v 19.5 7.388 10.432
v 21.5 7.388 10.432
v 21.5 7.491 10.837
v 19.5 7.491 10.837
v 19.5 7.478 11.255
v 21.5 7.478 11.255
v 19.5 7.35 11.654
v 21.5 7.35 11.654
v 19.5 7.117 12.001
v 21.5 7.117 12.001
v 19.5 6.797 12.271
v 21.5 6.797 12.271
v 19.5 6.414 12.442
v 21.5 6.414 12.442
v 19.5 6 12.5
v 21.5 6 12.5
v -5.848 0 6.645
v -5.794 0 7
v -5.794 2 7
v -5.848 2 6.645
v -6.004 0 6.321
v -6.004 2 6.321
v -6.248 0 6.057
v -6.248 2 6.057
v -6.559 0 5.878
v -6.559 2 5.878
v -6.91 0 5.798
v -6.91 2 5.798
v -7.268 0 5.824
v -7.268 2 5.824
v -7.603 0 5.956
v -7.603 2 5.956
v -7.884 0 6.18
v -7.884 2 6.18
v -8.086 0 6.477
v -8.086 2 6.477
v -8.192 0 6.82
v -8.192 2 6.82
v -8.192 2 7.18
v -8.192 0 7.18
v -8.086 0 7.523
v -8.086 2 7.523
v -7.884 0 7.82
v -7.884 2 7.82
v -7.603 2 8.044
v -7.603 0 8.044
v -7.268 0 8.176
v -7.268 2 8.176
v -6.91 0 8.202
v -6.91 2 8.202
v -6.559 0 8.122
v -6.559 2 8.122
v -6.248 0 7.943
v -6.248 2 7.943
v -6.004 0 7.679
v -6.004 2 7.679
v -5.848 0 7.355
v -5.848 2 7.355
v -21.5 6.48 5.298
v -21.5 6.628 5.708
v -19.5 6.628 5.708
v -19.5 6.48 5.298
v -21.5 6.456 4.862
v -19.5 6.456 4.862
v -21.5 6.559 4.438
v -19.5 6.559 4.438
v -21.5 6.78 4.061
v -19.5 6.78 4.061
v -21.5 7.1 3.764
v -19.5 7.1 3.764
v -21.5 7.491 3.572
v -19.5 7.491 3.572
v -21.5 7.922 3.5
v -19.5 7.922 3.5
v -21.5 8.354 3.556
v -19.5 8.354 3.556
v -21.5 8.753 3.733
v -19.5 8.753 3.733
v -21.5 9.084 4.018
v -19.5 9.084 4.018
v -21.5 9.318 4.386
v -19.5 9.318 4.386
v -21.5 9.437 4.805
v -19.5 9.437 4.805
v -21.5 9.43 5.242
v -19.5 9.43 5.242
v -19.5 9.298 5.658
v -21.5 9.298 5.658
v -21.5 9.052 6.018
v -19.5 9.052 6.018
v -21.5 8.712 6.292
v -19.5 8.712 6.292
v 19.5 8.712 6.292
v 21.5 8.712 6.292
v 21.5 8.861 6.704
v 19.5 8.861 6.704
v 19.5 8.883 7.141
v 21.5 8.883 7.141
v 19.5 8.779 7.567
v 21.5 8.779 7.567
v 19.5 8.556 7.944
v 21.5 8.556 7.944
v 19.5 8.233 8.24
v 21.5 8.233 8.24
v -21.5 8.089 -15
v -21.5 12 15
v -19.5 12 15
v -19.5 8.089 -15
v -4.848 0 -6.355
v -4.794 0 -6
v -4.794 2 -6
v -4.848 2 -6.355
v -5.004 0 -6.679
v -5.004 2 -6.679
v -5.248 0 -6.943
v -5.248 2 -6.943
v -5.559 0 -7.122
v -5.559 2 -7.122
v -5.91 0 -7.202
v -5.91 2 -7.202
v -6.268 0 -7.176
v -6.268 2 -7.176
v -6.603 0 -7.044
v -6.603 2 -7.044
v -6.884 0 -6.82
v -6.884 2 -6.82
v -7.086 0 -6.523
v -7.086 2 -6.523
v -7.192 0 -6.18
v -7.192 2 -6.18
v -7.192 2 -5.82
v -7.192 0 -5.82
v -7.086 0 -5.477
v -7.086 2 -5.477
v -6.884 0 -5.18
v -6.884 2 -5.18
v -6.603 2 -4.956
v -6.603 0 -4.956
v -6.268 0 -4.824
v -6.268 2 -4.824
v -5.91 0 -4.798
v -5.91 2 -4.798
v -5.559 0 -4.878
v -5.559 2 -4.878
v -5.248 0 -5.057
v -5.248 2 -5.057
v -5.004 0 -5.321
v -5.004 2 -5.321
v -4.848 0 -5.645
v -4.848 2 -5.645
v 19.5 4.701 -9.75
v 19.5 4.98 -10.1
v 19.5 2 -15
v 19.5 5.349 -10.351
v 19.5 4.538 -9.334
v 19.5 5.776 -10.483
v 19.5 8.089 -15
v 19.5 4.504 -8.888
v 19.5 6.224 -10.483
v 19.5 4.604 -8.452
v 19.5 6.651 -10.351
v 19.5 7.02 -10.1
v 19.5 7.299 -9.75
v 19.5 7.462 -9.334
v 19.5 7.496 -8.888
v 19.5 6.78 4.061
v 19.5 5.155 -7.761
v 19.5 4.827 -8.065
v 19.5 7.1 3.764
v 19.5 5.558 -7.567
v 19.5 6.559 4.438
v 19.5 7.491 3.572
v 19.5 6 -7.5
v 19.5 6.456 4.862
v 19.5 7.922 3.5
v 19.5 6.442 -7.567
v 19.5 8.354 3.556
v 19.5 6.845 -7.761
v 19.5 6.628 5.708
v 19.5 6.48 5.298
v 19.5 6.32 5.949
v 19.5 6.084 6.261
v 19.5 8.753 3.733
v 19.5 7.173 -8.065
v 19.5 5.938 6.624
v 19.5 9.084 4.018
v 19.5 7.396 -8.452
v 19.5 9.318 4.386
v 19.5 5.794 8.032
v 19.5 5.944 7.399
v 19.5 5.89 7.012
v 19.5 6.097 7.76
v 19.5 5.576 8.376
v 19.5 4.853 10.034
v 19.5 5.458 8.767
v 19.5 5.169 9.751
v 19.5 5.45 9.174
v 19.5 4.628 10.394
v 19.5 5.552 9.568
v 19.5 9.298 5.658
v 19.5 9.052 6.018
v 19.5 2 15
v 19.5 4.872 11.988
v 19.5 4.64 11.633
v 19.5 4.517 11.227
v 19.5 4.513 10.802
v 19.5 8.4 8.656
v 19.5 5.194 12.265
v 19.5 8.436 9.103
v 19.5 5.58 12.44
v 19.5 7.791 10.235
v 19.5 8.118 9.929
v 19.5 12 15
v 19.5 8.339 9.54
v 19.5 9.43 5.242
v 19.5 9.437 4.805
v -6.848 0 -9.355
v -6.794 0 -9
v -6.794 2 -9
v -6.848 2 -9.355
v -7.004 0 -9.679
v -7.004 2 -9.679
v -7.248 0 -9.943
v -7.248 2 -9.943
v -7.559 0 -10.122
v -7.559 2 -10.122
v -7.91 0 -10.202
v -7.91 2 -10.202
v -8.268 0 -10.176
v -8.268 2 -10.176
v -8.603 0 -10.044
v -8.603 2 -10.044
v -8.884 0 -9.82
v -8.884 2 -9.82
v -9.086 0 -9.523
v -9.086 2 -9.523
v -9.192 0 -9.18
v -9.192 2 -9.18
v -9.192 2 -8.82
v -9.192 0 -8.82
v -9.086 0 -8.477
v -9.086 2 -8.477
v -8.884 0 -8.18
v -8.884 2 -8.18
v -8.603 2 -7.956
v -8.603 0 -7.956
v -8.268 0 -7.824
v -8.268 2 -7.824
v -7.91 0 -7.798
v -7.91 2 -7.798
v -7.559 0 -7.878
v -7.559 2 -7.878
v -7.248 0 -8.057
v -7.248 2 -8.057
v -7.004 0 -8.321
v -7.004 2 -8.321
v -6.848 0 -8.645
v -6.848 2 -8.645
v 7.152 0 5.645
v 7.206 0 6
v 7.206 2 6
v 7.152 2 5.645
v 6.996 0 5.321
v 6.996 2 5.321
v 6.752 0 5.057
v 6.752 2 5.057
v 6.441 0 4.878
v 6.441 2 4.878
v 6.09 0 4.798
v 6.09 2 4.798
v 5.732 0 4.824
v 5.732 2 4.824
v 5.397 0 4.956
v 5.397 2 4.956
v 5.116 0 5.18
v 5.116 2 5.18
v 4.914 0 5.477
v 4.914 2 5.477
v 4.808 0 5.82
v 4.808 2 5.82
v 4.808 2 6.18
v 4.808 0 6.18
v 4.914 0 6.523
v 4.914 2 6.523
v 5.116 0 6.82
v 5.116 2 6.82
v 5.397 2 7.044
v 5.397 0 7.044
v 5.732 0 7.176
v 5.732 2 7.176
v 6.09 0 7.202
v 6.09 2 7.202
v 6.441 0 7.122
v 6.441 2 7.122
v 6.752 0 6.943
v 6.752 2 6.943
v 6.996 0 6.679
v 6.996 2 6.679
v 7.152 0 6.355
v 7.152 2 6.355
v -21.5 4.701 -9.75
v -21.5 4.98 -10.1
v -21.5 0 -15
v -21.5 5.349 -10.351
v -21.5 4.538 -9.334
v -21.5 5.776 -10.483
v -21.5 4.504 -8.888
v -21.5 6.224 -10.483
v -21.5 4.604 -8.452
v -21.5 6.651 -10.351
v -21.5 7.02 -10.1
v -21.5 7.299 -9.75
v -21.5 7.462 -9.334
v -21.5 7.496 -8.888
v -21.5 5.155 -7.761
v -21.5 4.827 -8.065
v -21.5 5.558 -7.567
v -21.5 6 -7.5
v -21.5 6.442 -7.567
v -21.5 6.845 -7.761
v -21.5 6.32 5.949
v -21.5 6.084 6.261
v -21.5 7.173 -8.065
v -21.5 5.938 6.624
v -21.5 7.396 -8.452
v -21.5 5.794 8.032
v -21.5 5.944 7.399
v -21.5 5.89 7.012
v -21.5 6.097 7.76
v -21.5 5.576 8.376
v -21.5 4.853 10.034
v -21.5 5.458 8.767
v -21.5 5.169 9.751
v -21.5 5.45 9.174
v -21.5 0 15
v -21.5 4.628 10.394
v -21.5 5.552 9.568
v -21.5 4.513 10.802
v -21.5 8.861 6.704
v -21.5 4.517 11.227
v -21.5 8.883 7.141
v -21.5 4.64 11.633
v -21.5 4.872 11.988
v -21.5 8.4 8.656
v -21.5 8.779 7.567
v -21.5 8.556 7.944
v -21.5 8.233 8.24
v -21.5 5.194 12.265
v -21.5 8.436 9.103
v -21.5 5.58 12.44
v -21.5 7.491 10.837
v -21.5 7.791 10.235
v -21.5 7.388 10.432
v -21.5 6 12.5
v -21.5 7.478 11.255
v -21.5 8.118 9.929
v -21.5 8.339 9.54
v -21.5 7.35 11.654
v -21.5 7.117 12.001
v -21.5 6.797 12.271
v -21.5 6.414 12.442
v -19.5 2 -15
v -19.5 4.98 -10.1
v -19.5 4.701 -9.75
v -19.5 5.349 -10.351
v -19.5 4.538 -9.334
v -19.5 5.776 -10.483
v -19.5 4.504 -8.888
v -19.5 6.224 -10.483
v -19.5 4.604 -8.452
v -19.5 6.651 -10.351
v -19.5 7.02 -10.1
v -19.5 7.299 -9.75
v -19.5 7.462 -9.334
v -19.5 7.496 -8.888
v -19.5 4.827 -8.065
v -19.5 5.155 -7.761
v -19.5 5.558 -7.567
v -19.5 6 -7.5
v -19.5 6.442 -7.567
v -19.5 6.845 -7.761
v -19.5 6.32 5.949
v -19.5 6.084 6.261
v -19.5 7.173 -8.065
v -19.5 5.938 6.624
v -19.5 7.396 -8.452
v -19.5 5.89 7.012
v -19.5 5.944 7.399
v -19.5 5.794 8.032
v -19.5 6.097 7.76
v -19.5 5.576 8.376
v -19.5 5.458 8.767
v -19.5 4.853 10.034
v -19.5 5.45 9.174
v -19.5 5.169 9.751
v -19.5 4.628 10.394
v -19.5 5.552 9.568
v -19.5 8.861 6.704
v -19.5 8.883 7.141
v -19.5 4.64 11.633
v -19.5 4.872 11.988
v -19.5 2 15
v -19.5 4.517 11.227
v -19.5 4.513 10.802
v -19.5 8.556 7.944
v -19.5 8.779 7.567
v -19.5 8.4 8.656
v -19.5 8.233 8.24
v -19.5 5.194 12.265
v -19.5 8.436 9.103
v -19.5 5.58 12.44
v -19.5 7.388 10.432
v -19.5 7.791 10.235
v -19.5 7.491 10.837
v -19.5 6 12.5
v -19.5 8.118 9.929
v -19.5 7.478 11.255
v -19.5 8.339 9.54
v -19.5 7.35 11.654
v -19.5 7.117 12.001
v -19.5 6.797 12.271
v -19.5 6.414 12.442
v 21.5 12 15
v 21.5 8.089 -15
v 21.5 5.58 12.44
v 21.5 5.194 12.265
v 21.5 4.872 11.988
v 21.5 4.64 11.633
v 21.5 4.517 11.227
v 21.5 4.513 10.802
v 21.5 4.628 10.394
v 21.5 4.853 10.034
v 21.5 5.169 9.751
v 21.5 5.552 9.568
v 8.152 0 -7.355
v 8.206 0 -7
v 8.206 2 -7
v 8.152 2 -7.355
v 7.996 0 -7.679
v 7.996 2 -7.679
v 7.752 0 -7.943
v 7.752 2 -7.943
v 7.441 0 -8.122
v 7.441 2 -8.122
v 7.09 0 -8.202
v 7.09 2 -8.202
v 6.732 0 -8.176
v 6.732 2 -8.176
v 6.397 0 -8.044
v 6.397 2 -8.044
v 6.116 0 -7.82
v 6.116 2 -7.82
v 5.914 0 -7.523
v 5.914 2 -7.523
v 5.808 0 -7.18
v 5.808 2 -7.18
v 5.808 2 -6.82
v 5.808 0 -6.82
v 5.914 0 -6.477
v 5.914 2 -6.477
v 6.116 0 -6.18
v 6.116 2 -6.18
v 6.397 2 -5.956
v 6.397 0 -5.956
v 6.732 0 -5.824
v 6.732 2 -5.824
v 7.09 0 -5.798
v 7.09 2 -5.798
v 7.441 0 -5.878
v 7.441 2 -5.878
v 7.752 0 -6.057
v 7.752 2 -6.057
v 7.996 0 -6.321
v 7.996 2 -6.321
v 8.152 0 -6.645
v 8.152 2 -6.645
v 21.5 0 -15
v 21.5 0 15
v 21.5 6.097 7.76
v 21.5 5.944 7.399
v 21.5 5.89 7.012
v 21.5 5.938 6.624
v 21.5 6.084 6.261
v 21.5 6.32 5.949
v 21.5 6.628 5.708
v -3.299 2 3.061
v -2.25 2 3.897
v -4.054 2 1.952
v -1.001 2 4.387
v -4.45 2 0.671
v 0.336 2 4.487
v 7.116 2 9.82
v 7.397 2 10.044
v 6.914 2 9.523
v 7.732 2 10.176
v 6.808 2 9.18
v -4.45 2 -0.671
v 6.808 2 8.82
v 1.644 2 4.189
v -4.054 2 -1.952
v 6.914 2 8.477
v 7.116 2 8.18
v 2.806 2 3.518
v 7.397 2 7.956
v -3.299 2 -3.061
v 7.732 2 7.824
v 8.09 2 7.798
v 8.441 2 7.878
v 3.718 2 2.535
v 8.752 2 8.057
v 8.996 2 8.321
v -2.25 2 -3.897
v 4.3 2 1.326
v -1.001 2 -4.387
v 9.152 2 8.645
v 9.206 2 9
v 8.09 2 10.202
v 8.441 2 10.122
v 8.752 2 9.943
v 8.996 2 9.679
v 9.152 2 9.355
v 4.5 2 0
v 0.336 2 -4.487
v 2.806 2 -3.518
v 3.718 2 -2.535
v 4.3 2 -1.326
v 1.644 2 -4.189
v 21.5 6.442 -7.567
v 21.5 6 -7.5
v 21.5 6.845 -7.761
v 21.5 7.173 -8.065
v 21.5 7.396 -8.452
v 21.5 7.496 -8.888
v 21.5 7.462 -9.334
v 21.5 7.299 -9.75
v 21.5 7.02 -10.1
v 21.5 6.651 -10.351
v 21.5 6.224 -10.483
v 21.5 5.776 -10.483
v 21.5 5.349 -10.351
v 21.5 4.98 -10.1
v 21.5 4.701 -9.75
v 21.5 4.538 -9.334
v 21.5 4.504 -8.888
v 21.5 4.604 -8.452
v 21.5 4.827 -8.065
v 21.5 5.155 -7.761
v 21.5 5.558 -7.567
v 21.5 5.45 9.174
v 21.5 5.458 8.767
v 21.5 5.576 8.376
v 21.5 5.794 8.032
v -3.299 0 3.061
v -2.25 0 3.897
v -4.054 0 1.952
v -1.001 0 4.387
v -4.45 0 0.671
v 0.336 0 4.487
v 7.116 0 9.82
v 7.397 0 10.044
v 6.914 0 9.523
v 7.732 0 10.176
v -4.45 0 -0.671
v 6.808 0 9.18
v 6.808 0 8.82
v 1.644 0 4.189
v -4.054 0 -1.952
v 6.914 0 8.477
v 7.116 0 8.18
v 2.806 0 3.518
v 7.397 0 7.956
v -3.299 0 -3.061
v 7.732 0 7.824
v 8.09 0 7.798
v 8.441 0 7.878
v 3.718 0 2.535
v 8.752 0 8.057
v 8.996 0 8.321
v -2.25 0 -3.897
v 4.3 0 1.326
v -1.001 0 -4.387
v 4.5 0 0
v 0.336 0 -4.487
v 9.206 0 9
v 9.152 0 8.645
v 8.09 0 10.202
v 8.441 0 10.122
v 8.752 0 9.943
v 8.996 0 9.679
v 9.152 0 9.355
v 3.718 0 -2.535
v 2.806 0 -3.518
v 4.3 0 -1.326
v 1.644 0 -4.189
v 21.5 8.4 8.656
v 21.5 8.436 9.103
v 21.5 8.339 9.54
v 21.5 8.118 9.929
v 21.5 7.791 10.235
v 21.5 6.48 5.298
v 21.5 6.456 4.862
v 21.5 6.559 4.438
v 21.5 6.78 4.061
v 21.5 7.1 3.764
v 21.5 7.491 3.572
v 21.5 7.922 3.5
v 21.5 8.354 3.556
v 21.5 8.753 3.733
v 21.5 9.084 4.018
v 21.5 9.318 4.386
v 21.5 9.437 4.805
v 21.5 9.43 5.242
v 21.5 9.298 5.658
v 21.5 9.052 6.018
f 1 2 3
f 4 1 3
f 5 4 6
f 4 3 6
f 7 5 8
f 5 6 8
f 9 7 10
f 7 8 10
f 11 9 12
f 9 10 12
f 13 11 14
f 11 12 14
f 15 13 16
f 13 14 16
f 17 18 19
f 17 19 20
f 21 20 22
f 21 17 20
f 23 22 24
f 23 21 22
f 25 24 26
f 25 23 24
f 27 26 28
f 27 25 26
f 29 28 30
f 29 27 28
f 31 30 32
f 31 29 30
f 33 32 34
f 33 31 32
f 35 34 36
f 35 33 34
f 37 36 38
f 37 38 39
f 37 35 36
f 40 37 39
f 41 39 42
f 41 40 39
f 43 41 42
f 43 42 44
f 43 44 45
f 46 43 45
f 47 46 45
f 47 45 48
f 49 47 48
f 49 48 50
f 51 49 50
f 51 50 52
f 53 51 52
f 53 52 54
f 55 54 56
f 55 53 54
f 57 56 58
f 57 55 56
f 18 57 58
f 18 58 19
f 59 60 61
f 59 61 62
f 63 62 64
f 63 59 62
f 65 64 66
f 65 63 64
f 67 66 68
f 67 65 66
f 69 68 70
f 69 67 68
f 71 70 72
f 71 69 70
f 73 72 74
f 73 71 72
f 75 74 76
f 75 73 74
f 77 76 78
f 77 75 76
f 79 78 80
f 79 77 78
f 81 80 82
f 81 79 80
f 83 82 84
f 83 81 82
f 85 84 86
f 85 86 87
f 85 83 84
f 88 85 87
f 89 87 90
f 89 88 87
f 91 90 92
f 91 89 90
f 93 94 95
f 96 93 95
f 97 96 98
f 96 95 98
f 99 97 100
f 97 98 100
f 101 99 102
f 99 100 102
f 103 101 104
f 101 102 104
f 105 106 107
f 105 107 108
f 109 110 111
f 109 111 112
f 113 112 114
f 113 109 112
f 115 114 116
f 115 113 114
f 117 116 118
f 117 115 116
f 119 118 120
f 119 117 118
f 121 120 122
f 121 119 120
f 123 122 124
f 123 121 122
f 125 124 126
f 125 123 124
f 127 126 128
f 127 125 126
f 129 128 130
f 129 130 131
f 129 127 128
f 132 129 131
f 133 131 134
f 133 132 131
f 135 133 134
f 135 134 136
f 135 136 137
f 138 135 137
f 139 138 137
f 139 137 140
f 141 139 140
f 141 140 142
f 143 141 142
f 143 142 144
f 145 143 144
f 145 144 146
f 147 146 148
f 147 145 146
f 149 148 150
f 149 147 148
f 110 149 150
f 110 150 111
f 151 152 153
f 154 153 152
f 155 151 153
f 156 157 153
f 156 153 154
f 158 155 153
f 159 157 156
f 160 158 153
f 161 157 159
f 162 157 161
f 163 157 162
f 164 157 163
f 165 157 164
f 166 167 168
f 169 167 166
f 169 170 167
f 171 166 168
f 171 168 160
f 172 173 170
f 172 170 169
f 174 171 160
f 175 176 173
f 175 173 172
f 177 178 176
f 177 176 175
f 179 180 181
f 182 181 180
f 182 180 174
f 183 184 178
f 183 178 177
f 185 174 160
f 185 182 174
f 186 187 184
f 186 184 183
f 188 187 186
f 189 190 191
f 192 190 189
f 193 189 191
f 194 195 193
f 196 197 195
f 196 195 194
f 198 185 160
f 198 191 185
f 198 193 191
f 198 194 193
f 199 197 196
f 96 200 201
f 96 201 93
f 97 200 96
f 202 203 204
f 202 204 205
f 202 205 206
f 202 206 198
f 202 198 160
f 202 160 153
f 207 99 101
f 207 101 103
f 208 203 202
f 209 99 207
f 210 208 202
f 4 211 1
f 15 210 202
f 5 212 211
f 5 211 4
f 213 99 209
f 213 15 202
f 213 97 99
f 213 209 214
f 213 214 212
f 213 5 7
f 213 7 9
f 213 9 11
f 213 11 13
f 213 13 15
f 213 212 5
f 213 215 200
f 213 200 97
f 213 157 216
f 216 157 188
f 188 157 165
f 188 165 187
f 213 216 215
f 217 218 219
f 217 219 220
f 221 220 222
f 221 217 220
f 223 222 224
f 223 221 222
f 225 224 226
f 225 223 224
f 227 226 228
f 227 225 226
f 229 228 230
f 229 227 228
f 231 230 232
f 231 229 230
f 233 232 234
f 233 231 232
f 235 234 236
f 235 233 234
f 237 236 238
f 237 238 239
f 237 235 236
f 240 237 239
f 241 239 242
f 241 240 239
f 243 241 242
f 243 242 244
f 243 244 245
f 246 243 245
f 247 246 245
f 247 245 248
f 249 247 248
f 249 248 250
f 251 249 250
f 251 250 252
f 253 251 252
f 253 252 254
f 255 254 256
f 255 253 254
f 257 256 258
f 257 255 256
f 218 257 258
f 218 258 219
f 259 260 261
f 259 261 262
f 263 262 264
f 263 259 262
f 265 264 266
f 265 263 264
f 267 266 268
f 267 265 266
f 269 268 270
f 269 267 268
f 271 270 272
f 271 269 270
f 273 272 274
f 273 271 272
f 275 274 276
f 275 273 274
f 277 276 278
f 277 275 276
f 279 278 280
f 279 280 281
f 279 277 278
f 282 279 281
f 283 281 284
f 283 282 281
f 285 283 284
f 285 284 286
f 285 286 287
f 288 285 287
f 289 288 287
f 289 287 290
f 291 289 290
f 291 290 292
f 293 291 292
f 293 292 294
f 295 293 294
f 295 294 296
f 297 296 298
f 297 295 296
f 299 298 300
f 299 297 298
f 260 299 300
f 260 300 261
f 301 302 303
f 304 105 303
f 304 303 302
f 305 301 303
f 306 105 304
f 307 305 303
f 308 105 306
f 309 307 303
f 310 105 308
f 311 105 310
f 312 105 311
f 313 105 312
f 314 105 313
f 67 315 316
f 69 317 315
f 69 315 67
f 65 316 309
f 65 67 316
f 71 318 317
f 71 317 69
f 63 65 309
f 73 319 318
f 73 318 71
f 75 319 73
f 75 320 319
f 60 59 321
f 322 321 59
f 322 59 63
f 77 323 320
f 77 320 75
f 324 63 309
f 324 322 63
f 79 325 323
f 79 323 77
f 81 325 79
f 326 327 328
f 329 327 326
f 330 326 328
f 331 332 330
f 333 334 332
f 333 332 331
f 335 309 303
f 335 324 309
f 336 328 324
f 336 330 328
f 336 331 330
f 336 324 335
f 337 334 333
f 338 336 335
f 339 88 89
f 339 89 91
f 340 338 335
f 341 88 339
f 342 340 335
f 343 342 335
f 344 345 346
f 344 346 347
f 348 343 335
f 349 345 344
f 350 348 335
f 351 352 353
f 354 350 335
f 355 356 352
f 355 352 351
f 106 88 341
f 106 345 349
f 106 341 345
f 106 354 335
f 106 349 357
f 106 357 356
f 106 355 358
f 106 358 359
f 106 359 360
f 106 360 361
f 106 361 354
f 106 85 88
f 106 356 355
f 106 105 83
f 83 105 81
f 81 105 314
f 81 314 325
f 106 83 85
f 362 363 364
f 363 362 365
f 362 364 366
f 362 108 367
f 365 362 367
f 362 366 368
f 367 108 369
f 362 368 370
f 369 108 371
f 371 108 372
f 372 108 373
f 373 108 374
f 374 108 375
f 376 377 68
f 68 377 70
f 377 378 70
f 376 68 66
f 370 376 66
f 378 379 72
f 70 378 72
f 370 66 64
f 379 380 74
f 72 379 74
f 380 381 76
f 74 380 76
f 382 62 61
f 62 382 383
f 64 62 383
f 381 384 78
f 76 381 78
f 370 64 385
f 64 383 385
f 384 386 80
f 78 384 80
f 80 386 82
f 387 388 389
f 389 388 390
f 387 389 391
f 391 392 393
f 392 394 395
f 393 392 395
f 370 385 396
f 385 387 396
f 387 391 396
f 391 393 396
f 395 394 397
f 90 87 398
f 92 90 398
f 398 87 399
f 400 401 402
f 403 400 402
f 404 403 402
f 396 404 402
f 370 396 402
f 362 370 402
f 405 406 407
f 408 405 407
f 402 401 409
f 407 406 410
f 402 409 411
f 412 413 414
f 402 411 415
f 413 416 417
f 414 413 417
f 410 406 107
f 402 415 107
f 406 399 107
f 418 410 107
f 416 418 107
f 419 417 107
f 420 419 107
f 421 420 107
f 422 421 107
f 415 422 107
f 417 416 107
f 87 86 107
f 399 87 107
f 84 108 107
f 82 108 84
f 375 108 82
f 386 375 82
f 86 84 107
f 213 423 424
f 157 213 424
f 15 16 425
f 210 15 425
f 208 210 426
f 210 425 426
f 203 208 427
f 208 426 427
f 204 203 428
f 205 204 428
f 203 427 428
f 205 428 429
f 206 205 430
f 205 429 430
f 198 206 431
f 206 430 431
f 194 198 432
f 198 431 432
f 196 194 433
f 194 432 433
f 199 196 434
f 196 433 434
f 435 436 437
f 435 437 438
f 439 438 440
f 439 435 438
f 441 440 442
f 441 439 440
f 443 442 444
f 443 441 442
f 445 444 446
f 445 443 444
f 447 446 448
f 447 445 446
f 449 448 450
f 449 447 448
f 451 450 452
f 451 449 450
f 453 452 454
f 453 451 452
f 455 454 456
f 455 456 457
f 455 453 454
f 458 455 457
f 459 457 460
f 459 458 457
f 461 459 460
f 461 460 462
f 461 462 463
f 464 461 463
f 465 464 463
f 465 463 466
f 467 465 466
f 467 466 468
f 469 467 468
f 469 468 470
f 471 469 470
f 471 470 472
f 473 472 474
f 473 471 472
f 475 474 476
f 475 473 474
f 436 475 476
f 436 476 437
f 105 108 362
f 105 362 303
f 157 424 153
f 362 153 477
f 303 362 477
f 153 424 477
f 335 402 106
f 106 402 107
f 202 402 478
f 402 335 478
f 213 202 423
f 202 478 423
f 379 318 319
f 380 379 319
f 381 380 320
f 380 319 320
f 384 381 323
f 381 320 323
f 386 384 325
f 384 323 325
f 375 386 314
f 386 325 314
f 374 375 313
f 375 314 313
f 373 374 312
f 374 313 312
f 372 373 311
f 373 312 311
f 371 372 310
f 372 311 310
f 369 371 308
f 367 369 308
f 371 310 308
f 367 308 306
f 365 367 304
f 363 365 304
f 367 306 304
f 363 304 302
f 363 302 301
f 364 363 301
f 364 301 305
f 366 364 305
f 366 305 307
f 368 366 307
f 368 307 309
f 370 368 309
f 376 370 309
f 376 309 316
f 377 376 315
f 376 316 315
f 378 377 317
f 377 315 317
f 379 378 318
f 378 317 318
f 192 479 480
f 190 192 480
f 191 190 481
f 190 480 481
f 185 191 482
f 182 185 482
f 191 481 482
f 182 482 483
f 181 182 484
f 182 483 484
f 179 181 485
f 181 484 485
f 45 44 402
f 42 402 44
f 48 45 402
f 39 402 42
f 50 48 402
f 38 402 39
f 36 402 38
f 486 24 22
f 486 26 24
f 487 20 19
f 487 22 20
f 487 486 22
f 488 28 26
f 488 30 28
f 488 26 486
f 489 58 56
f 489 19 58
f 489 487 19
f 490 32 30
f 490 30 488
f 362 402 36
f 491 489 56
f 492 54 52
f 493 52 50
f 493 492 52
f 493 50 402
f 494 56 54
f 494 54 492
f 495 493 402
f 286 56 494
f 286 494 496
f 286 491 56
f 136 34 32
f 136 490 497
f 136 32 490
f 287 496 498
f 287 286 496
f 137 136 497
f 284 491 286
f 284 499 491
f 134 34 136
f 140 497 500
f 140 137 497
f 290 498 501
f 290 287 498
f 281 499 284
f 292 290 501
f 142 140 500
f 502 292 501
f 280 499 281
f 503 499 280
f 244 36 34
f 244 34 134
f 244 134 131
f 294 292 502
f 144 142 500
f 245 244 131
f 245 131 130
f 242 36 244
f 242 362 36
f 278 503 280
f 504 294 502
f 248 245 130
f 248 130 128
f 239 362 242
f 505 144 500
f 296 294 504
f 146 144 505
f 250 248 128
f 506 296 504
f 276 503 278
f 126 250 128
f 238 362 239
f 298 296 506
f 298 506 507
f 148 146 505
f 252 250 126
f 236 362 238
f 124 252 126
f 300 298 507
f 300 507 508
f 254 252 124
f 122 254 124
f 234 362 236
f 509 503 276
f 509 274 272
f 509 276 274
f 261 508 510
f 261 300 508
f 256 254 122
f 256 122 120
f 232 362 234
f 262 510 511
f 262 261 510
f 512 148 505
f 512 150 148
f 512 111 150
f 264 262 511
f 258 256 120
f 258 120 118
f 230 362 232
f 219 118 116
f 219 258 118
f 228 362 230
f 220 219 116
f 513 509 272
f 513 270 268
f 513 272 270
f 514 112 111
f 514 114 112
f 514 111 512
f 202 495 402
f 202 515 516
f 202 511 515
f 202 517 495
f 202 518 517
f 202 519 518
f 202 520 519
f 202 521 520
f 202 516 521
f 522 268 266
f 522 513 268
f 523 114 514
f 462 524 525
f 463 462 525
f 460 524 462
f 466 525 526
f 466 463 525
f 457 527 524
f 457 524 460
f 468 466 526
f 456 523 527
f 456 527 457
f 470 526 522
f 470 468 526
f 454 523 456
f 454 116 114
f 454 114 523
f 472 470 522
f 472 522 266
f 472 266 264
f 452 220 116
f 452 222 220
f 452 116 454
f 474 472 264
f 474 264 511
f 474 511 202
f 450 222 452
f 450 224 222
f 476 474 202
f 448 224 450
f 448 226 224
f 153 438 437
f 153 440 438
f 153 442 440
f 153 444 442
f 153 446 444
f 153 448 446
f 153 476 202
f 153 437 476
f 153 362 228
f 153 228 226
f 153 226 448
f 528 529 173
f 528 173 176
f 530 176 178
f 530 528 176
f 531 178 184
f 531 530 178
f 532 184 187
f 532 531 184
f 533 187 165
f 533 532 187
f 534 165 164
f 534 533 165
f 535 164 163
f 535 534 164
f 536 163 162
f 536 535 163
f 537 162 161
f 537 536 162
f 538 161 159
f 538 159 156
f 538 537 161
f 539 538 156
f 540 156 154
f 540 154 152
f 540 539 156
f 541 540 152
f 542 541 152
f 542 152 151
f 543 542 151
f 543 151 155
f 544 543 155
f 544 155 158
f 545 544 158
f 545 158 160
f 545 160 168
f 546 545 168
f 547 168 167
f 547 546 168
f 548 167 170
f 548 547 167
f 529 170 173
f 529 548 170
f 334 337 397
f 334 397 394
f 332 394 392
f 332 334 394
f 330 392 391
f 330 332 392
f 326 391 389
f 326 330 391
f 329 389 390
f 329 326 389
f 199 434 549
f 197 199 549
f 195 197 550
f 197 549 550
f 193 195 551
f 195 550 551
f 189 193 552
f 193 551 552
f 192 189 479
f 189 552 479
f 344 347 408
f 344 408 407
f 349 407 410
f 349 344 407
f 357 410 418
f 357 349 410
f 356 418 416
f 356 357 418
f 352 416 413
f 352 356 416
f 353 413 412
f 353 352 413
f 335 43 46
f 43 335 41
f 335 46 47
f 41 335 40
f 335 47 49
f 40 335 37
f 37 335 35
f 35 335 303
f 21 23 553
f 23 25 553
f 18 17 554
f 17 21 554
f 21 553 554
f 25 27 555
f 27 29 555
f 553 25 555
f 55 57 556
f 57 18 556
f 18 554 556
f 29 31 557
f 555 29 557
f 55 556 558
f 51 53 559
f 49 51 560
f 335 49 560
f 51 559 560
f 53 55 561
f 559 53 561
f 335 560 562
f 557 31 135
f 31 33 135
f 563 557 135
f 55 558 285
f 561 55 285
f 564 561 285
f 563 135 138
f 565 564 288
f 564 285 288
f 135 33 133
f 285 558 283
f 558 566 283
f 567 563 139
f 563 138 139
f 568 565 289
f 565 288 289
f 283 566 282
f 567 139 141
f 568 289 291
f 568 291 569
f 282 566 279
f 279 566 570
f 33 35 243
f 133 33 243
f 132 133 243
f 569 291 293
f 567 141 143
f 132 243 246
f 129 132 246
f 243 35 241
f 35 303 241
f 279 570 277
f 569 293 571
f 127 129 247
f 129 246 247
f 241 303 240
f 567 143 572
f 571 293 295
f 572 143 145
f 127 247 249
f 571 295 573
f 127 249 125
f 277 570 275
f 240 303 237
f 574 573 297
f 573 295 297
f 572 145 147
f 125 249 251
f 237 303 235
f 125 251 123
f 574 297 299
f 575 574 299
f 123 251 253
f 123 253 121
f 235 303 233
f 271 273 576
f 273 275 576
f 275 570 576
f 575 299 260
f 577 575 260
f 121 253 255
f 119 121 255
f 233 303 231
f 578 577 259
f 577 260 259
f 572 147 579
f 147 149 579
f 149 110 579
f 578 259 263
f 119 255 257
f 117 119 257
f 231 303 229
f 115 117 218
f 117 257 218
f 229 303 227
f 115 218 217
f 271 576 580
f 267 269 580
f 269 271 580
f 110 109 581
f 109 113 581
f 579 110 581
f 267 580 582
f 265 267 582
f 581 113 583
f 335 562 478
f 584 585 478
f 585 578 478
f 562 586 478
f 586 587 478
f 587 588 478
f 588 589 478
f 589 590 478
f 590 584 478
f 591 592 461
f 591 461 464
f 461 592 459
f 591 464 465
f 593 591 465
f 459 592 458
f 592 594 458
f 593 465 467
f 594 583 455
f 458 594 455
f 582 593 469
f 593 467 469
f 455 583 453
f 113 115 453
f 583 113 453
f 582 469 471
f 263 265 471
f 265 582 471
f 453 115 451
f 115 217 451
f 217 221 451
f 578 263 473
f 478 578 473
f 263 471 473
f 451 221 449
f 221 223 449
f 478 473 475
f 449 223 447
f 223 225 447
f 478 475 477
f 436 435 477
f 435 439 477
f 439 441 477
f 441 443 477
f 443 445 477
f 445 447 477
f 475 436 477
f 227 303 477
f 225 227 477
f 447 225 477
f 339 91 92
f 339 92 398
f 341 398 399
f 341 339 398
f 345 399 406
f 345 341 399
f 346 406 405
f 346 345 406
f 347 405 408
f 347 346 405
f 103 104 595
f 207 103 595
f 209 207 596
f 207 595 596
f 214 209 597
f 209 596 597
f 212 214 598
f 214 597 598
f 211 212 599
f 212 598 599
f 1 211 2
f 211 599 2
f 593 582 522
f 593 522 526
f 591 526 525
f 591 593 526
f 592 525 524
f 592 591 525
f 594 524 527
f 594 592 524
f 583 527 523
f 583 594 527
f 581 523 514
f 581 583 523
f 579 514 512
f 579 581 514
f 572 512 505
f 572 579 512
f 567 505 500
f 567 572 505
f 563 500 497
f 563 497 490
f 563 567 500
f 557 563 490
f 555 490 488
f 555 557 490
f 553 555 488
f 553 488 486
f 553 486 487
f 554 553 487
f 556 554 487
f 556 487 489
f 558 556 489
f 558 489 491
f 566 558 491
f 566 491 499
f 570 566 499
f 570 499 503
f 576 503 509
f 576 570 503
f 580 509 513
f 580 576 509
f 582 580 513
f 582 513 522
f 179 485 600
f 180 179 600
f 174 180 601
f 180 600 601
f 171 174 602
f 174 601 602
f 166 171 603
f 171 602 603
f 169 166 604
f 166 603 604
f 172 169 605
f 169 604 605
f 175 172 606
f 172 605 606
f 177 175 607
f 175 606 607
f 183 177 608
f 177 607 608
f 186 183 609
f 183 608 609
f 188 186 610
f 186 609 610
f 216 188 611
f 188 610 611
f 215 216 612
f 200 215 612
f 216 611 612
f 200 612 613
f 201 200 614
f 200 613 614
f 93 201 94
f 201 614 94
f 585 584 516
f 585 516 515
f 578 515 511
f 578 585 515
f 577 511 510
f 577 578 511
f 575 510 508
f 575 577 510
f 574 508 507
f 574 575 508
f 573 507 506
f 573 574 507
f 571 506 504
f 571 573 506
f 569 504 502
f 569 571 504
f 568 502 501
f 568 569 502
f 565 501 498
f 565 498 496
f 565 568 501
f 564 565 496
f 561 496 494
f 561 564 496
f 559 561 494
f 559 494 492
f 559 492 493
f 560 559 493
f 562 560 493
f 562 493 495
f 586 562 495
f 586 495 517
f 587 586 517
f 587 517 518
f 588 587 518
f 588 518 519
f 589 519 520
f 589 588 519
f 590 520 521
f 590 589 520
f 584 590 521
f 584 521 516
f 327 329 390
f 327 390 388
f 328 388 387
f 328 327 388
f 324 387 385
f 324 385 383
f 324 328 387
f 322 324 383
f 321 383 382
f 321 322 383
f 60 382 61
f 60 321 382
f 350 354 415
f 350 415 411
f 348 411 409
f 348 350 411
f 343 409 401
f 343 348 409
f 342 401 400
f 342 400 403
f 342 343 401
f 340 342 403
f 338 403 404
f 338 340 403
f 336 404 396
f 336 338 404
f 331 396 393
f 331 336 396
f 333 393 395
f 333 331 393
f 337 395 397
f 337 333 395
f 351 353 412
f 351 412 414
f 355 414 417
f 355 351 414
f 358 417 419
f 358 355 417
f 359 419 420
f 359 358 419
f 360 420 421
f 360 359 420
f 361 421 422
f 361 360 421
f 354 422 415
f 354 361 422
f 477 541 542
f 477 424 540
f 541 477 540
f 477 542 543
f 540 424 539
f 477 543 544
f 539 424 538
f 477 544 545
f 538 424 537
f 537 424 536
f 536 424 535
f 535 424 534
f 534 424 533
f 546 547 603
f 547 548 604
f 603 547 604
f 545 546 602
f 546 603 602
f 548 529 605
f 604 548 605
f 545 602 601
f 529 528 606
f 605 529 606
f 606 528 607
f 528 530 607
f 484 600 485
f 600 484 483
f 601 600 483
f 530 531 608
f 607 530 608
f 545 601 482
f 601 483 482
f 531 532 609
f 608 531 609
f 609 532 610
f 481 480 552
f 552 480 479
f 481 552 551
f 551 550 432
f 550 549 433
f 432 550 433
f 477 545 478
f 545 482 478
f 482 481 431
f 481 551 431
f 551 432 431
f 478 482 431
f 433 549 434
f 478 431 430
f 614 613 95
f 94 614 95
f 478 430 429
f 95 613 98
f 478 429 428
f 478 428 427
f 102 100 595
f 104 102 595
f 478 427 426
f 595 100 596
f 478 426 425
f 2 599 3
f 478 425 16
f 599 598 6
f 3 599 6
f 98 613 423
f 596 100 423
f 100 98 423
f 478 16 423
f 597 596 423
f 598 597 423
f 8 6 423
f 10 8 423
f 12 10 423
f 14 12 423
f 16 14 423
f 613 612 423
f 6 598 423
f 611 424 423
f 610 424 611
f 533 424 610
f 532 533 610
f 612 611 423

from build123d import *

# Parameters (mm, degrees)
ESBO_O1_W                = 43
ESBO_O1_H                = 30
ESBO_O1_R                = 4.5
ESBO_O1_R_2              = 1.205837633
RESSALTO_EXTRUS_O1_DEPTH = 2
ESBO_O2_R                = 1.5
RESSALTO_EXTRUS_O2_DEPTH = 2


with BuildPart() as part:
    # Esboço1 → Ressalto-extrusão1 (new body)
    with BuildSketch(Plane(origin=(0, 0, 0), x_dir=(1, 0, 0), z_dir=(0, 1, 0))):
        Rectangle(ESBO_O1_W, ESBO_O1_H)
        Circle(ESBO_O1_R, mode=Mode.SUBTRACT)
        with Locations((7, 7)):
            Circle(ESBO_O1_R_2, mode=Mode.SUBTRACT)
        with Locations((-6, 6)):
            Circle(ESBO_O1_R_2, mode=Mode.SUBTRACT)
        with Locations((-8, 9)):
            Circle(ESBO_O1_R_2, mode=Mode.SUBTRACT)
        with Locations((-7, -7)):
            Circle(ESBO_O1_R_2, mode=Mode.SUBTRACT)
        with Locations((6, -6)):
            Circle(ESBO_O1_R_2, mode=Mode.SUBTRACT)
        with Locations((8, -9)):
            Circle(ESBO_O1_R_2, mode=Mode.SUBTRACT)
    extrude(amount=RESSALTO_EXTRUS_O1_DEPTH)

    # Esboço2 → Ressalto-extrusão2 (add)
    with BuildSketch(Plane.ZY.offset(21.5)):
        Polygon((15, 2), (15, 12), (-15, 8.089445099), (-15, 2), align=None)
        with Locations((-9, 6)):
            Circle(ESBO_O2_R, mode=Mode.SUBTRACT)
        with BuildLine():
            ThreePointArc((8.240400933, 8.233448591), (9.539925295, 8.339457279), (10.431505763, 7.388097368))
            ThreePointArc((10.431505763, 7.388097368), (11.835840488, 7.245540316), (12.5, 6))
            ThreePointArc((12.5, 6), (11.226651005, 4.51722243), (9.568494237, 5.551902632))
            ThreePointArc((9.568494237, 5.551902632), (8.567535869, 5.503694052), (7.759599067, 6.096551409))
            ThreePointArc((7.759599067, 6.096551409), (6.624037685, 5.937880054), (5.708151293, 6.62768319))
            ThreePointArc((5.708151293, 6.62768319), (3.55555397, 8.354444888), (6.291848707, 8.71231681))
            ThreePointArc((6.291848707, 8.71231681), (7.357982, 8.84665675), (8.240400933, 8.233448591))
        make_face(mode=Mode.SUBTRACT)
    ressalto_extrus_o2 = extrude(amount=-RESSALTO_EXTRUS_O2_DEPTH)

    # Espelhar1: Ressalto-extrusão2 across plane
    add(ressalto_extrus_o2.mirror(Plane(origin=(0, 0, 0), x_dir=(0, 0, 1), z_dir=(1, 0, 0))))


solid = part.part
